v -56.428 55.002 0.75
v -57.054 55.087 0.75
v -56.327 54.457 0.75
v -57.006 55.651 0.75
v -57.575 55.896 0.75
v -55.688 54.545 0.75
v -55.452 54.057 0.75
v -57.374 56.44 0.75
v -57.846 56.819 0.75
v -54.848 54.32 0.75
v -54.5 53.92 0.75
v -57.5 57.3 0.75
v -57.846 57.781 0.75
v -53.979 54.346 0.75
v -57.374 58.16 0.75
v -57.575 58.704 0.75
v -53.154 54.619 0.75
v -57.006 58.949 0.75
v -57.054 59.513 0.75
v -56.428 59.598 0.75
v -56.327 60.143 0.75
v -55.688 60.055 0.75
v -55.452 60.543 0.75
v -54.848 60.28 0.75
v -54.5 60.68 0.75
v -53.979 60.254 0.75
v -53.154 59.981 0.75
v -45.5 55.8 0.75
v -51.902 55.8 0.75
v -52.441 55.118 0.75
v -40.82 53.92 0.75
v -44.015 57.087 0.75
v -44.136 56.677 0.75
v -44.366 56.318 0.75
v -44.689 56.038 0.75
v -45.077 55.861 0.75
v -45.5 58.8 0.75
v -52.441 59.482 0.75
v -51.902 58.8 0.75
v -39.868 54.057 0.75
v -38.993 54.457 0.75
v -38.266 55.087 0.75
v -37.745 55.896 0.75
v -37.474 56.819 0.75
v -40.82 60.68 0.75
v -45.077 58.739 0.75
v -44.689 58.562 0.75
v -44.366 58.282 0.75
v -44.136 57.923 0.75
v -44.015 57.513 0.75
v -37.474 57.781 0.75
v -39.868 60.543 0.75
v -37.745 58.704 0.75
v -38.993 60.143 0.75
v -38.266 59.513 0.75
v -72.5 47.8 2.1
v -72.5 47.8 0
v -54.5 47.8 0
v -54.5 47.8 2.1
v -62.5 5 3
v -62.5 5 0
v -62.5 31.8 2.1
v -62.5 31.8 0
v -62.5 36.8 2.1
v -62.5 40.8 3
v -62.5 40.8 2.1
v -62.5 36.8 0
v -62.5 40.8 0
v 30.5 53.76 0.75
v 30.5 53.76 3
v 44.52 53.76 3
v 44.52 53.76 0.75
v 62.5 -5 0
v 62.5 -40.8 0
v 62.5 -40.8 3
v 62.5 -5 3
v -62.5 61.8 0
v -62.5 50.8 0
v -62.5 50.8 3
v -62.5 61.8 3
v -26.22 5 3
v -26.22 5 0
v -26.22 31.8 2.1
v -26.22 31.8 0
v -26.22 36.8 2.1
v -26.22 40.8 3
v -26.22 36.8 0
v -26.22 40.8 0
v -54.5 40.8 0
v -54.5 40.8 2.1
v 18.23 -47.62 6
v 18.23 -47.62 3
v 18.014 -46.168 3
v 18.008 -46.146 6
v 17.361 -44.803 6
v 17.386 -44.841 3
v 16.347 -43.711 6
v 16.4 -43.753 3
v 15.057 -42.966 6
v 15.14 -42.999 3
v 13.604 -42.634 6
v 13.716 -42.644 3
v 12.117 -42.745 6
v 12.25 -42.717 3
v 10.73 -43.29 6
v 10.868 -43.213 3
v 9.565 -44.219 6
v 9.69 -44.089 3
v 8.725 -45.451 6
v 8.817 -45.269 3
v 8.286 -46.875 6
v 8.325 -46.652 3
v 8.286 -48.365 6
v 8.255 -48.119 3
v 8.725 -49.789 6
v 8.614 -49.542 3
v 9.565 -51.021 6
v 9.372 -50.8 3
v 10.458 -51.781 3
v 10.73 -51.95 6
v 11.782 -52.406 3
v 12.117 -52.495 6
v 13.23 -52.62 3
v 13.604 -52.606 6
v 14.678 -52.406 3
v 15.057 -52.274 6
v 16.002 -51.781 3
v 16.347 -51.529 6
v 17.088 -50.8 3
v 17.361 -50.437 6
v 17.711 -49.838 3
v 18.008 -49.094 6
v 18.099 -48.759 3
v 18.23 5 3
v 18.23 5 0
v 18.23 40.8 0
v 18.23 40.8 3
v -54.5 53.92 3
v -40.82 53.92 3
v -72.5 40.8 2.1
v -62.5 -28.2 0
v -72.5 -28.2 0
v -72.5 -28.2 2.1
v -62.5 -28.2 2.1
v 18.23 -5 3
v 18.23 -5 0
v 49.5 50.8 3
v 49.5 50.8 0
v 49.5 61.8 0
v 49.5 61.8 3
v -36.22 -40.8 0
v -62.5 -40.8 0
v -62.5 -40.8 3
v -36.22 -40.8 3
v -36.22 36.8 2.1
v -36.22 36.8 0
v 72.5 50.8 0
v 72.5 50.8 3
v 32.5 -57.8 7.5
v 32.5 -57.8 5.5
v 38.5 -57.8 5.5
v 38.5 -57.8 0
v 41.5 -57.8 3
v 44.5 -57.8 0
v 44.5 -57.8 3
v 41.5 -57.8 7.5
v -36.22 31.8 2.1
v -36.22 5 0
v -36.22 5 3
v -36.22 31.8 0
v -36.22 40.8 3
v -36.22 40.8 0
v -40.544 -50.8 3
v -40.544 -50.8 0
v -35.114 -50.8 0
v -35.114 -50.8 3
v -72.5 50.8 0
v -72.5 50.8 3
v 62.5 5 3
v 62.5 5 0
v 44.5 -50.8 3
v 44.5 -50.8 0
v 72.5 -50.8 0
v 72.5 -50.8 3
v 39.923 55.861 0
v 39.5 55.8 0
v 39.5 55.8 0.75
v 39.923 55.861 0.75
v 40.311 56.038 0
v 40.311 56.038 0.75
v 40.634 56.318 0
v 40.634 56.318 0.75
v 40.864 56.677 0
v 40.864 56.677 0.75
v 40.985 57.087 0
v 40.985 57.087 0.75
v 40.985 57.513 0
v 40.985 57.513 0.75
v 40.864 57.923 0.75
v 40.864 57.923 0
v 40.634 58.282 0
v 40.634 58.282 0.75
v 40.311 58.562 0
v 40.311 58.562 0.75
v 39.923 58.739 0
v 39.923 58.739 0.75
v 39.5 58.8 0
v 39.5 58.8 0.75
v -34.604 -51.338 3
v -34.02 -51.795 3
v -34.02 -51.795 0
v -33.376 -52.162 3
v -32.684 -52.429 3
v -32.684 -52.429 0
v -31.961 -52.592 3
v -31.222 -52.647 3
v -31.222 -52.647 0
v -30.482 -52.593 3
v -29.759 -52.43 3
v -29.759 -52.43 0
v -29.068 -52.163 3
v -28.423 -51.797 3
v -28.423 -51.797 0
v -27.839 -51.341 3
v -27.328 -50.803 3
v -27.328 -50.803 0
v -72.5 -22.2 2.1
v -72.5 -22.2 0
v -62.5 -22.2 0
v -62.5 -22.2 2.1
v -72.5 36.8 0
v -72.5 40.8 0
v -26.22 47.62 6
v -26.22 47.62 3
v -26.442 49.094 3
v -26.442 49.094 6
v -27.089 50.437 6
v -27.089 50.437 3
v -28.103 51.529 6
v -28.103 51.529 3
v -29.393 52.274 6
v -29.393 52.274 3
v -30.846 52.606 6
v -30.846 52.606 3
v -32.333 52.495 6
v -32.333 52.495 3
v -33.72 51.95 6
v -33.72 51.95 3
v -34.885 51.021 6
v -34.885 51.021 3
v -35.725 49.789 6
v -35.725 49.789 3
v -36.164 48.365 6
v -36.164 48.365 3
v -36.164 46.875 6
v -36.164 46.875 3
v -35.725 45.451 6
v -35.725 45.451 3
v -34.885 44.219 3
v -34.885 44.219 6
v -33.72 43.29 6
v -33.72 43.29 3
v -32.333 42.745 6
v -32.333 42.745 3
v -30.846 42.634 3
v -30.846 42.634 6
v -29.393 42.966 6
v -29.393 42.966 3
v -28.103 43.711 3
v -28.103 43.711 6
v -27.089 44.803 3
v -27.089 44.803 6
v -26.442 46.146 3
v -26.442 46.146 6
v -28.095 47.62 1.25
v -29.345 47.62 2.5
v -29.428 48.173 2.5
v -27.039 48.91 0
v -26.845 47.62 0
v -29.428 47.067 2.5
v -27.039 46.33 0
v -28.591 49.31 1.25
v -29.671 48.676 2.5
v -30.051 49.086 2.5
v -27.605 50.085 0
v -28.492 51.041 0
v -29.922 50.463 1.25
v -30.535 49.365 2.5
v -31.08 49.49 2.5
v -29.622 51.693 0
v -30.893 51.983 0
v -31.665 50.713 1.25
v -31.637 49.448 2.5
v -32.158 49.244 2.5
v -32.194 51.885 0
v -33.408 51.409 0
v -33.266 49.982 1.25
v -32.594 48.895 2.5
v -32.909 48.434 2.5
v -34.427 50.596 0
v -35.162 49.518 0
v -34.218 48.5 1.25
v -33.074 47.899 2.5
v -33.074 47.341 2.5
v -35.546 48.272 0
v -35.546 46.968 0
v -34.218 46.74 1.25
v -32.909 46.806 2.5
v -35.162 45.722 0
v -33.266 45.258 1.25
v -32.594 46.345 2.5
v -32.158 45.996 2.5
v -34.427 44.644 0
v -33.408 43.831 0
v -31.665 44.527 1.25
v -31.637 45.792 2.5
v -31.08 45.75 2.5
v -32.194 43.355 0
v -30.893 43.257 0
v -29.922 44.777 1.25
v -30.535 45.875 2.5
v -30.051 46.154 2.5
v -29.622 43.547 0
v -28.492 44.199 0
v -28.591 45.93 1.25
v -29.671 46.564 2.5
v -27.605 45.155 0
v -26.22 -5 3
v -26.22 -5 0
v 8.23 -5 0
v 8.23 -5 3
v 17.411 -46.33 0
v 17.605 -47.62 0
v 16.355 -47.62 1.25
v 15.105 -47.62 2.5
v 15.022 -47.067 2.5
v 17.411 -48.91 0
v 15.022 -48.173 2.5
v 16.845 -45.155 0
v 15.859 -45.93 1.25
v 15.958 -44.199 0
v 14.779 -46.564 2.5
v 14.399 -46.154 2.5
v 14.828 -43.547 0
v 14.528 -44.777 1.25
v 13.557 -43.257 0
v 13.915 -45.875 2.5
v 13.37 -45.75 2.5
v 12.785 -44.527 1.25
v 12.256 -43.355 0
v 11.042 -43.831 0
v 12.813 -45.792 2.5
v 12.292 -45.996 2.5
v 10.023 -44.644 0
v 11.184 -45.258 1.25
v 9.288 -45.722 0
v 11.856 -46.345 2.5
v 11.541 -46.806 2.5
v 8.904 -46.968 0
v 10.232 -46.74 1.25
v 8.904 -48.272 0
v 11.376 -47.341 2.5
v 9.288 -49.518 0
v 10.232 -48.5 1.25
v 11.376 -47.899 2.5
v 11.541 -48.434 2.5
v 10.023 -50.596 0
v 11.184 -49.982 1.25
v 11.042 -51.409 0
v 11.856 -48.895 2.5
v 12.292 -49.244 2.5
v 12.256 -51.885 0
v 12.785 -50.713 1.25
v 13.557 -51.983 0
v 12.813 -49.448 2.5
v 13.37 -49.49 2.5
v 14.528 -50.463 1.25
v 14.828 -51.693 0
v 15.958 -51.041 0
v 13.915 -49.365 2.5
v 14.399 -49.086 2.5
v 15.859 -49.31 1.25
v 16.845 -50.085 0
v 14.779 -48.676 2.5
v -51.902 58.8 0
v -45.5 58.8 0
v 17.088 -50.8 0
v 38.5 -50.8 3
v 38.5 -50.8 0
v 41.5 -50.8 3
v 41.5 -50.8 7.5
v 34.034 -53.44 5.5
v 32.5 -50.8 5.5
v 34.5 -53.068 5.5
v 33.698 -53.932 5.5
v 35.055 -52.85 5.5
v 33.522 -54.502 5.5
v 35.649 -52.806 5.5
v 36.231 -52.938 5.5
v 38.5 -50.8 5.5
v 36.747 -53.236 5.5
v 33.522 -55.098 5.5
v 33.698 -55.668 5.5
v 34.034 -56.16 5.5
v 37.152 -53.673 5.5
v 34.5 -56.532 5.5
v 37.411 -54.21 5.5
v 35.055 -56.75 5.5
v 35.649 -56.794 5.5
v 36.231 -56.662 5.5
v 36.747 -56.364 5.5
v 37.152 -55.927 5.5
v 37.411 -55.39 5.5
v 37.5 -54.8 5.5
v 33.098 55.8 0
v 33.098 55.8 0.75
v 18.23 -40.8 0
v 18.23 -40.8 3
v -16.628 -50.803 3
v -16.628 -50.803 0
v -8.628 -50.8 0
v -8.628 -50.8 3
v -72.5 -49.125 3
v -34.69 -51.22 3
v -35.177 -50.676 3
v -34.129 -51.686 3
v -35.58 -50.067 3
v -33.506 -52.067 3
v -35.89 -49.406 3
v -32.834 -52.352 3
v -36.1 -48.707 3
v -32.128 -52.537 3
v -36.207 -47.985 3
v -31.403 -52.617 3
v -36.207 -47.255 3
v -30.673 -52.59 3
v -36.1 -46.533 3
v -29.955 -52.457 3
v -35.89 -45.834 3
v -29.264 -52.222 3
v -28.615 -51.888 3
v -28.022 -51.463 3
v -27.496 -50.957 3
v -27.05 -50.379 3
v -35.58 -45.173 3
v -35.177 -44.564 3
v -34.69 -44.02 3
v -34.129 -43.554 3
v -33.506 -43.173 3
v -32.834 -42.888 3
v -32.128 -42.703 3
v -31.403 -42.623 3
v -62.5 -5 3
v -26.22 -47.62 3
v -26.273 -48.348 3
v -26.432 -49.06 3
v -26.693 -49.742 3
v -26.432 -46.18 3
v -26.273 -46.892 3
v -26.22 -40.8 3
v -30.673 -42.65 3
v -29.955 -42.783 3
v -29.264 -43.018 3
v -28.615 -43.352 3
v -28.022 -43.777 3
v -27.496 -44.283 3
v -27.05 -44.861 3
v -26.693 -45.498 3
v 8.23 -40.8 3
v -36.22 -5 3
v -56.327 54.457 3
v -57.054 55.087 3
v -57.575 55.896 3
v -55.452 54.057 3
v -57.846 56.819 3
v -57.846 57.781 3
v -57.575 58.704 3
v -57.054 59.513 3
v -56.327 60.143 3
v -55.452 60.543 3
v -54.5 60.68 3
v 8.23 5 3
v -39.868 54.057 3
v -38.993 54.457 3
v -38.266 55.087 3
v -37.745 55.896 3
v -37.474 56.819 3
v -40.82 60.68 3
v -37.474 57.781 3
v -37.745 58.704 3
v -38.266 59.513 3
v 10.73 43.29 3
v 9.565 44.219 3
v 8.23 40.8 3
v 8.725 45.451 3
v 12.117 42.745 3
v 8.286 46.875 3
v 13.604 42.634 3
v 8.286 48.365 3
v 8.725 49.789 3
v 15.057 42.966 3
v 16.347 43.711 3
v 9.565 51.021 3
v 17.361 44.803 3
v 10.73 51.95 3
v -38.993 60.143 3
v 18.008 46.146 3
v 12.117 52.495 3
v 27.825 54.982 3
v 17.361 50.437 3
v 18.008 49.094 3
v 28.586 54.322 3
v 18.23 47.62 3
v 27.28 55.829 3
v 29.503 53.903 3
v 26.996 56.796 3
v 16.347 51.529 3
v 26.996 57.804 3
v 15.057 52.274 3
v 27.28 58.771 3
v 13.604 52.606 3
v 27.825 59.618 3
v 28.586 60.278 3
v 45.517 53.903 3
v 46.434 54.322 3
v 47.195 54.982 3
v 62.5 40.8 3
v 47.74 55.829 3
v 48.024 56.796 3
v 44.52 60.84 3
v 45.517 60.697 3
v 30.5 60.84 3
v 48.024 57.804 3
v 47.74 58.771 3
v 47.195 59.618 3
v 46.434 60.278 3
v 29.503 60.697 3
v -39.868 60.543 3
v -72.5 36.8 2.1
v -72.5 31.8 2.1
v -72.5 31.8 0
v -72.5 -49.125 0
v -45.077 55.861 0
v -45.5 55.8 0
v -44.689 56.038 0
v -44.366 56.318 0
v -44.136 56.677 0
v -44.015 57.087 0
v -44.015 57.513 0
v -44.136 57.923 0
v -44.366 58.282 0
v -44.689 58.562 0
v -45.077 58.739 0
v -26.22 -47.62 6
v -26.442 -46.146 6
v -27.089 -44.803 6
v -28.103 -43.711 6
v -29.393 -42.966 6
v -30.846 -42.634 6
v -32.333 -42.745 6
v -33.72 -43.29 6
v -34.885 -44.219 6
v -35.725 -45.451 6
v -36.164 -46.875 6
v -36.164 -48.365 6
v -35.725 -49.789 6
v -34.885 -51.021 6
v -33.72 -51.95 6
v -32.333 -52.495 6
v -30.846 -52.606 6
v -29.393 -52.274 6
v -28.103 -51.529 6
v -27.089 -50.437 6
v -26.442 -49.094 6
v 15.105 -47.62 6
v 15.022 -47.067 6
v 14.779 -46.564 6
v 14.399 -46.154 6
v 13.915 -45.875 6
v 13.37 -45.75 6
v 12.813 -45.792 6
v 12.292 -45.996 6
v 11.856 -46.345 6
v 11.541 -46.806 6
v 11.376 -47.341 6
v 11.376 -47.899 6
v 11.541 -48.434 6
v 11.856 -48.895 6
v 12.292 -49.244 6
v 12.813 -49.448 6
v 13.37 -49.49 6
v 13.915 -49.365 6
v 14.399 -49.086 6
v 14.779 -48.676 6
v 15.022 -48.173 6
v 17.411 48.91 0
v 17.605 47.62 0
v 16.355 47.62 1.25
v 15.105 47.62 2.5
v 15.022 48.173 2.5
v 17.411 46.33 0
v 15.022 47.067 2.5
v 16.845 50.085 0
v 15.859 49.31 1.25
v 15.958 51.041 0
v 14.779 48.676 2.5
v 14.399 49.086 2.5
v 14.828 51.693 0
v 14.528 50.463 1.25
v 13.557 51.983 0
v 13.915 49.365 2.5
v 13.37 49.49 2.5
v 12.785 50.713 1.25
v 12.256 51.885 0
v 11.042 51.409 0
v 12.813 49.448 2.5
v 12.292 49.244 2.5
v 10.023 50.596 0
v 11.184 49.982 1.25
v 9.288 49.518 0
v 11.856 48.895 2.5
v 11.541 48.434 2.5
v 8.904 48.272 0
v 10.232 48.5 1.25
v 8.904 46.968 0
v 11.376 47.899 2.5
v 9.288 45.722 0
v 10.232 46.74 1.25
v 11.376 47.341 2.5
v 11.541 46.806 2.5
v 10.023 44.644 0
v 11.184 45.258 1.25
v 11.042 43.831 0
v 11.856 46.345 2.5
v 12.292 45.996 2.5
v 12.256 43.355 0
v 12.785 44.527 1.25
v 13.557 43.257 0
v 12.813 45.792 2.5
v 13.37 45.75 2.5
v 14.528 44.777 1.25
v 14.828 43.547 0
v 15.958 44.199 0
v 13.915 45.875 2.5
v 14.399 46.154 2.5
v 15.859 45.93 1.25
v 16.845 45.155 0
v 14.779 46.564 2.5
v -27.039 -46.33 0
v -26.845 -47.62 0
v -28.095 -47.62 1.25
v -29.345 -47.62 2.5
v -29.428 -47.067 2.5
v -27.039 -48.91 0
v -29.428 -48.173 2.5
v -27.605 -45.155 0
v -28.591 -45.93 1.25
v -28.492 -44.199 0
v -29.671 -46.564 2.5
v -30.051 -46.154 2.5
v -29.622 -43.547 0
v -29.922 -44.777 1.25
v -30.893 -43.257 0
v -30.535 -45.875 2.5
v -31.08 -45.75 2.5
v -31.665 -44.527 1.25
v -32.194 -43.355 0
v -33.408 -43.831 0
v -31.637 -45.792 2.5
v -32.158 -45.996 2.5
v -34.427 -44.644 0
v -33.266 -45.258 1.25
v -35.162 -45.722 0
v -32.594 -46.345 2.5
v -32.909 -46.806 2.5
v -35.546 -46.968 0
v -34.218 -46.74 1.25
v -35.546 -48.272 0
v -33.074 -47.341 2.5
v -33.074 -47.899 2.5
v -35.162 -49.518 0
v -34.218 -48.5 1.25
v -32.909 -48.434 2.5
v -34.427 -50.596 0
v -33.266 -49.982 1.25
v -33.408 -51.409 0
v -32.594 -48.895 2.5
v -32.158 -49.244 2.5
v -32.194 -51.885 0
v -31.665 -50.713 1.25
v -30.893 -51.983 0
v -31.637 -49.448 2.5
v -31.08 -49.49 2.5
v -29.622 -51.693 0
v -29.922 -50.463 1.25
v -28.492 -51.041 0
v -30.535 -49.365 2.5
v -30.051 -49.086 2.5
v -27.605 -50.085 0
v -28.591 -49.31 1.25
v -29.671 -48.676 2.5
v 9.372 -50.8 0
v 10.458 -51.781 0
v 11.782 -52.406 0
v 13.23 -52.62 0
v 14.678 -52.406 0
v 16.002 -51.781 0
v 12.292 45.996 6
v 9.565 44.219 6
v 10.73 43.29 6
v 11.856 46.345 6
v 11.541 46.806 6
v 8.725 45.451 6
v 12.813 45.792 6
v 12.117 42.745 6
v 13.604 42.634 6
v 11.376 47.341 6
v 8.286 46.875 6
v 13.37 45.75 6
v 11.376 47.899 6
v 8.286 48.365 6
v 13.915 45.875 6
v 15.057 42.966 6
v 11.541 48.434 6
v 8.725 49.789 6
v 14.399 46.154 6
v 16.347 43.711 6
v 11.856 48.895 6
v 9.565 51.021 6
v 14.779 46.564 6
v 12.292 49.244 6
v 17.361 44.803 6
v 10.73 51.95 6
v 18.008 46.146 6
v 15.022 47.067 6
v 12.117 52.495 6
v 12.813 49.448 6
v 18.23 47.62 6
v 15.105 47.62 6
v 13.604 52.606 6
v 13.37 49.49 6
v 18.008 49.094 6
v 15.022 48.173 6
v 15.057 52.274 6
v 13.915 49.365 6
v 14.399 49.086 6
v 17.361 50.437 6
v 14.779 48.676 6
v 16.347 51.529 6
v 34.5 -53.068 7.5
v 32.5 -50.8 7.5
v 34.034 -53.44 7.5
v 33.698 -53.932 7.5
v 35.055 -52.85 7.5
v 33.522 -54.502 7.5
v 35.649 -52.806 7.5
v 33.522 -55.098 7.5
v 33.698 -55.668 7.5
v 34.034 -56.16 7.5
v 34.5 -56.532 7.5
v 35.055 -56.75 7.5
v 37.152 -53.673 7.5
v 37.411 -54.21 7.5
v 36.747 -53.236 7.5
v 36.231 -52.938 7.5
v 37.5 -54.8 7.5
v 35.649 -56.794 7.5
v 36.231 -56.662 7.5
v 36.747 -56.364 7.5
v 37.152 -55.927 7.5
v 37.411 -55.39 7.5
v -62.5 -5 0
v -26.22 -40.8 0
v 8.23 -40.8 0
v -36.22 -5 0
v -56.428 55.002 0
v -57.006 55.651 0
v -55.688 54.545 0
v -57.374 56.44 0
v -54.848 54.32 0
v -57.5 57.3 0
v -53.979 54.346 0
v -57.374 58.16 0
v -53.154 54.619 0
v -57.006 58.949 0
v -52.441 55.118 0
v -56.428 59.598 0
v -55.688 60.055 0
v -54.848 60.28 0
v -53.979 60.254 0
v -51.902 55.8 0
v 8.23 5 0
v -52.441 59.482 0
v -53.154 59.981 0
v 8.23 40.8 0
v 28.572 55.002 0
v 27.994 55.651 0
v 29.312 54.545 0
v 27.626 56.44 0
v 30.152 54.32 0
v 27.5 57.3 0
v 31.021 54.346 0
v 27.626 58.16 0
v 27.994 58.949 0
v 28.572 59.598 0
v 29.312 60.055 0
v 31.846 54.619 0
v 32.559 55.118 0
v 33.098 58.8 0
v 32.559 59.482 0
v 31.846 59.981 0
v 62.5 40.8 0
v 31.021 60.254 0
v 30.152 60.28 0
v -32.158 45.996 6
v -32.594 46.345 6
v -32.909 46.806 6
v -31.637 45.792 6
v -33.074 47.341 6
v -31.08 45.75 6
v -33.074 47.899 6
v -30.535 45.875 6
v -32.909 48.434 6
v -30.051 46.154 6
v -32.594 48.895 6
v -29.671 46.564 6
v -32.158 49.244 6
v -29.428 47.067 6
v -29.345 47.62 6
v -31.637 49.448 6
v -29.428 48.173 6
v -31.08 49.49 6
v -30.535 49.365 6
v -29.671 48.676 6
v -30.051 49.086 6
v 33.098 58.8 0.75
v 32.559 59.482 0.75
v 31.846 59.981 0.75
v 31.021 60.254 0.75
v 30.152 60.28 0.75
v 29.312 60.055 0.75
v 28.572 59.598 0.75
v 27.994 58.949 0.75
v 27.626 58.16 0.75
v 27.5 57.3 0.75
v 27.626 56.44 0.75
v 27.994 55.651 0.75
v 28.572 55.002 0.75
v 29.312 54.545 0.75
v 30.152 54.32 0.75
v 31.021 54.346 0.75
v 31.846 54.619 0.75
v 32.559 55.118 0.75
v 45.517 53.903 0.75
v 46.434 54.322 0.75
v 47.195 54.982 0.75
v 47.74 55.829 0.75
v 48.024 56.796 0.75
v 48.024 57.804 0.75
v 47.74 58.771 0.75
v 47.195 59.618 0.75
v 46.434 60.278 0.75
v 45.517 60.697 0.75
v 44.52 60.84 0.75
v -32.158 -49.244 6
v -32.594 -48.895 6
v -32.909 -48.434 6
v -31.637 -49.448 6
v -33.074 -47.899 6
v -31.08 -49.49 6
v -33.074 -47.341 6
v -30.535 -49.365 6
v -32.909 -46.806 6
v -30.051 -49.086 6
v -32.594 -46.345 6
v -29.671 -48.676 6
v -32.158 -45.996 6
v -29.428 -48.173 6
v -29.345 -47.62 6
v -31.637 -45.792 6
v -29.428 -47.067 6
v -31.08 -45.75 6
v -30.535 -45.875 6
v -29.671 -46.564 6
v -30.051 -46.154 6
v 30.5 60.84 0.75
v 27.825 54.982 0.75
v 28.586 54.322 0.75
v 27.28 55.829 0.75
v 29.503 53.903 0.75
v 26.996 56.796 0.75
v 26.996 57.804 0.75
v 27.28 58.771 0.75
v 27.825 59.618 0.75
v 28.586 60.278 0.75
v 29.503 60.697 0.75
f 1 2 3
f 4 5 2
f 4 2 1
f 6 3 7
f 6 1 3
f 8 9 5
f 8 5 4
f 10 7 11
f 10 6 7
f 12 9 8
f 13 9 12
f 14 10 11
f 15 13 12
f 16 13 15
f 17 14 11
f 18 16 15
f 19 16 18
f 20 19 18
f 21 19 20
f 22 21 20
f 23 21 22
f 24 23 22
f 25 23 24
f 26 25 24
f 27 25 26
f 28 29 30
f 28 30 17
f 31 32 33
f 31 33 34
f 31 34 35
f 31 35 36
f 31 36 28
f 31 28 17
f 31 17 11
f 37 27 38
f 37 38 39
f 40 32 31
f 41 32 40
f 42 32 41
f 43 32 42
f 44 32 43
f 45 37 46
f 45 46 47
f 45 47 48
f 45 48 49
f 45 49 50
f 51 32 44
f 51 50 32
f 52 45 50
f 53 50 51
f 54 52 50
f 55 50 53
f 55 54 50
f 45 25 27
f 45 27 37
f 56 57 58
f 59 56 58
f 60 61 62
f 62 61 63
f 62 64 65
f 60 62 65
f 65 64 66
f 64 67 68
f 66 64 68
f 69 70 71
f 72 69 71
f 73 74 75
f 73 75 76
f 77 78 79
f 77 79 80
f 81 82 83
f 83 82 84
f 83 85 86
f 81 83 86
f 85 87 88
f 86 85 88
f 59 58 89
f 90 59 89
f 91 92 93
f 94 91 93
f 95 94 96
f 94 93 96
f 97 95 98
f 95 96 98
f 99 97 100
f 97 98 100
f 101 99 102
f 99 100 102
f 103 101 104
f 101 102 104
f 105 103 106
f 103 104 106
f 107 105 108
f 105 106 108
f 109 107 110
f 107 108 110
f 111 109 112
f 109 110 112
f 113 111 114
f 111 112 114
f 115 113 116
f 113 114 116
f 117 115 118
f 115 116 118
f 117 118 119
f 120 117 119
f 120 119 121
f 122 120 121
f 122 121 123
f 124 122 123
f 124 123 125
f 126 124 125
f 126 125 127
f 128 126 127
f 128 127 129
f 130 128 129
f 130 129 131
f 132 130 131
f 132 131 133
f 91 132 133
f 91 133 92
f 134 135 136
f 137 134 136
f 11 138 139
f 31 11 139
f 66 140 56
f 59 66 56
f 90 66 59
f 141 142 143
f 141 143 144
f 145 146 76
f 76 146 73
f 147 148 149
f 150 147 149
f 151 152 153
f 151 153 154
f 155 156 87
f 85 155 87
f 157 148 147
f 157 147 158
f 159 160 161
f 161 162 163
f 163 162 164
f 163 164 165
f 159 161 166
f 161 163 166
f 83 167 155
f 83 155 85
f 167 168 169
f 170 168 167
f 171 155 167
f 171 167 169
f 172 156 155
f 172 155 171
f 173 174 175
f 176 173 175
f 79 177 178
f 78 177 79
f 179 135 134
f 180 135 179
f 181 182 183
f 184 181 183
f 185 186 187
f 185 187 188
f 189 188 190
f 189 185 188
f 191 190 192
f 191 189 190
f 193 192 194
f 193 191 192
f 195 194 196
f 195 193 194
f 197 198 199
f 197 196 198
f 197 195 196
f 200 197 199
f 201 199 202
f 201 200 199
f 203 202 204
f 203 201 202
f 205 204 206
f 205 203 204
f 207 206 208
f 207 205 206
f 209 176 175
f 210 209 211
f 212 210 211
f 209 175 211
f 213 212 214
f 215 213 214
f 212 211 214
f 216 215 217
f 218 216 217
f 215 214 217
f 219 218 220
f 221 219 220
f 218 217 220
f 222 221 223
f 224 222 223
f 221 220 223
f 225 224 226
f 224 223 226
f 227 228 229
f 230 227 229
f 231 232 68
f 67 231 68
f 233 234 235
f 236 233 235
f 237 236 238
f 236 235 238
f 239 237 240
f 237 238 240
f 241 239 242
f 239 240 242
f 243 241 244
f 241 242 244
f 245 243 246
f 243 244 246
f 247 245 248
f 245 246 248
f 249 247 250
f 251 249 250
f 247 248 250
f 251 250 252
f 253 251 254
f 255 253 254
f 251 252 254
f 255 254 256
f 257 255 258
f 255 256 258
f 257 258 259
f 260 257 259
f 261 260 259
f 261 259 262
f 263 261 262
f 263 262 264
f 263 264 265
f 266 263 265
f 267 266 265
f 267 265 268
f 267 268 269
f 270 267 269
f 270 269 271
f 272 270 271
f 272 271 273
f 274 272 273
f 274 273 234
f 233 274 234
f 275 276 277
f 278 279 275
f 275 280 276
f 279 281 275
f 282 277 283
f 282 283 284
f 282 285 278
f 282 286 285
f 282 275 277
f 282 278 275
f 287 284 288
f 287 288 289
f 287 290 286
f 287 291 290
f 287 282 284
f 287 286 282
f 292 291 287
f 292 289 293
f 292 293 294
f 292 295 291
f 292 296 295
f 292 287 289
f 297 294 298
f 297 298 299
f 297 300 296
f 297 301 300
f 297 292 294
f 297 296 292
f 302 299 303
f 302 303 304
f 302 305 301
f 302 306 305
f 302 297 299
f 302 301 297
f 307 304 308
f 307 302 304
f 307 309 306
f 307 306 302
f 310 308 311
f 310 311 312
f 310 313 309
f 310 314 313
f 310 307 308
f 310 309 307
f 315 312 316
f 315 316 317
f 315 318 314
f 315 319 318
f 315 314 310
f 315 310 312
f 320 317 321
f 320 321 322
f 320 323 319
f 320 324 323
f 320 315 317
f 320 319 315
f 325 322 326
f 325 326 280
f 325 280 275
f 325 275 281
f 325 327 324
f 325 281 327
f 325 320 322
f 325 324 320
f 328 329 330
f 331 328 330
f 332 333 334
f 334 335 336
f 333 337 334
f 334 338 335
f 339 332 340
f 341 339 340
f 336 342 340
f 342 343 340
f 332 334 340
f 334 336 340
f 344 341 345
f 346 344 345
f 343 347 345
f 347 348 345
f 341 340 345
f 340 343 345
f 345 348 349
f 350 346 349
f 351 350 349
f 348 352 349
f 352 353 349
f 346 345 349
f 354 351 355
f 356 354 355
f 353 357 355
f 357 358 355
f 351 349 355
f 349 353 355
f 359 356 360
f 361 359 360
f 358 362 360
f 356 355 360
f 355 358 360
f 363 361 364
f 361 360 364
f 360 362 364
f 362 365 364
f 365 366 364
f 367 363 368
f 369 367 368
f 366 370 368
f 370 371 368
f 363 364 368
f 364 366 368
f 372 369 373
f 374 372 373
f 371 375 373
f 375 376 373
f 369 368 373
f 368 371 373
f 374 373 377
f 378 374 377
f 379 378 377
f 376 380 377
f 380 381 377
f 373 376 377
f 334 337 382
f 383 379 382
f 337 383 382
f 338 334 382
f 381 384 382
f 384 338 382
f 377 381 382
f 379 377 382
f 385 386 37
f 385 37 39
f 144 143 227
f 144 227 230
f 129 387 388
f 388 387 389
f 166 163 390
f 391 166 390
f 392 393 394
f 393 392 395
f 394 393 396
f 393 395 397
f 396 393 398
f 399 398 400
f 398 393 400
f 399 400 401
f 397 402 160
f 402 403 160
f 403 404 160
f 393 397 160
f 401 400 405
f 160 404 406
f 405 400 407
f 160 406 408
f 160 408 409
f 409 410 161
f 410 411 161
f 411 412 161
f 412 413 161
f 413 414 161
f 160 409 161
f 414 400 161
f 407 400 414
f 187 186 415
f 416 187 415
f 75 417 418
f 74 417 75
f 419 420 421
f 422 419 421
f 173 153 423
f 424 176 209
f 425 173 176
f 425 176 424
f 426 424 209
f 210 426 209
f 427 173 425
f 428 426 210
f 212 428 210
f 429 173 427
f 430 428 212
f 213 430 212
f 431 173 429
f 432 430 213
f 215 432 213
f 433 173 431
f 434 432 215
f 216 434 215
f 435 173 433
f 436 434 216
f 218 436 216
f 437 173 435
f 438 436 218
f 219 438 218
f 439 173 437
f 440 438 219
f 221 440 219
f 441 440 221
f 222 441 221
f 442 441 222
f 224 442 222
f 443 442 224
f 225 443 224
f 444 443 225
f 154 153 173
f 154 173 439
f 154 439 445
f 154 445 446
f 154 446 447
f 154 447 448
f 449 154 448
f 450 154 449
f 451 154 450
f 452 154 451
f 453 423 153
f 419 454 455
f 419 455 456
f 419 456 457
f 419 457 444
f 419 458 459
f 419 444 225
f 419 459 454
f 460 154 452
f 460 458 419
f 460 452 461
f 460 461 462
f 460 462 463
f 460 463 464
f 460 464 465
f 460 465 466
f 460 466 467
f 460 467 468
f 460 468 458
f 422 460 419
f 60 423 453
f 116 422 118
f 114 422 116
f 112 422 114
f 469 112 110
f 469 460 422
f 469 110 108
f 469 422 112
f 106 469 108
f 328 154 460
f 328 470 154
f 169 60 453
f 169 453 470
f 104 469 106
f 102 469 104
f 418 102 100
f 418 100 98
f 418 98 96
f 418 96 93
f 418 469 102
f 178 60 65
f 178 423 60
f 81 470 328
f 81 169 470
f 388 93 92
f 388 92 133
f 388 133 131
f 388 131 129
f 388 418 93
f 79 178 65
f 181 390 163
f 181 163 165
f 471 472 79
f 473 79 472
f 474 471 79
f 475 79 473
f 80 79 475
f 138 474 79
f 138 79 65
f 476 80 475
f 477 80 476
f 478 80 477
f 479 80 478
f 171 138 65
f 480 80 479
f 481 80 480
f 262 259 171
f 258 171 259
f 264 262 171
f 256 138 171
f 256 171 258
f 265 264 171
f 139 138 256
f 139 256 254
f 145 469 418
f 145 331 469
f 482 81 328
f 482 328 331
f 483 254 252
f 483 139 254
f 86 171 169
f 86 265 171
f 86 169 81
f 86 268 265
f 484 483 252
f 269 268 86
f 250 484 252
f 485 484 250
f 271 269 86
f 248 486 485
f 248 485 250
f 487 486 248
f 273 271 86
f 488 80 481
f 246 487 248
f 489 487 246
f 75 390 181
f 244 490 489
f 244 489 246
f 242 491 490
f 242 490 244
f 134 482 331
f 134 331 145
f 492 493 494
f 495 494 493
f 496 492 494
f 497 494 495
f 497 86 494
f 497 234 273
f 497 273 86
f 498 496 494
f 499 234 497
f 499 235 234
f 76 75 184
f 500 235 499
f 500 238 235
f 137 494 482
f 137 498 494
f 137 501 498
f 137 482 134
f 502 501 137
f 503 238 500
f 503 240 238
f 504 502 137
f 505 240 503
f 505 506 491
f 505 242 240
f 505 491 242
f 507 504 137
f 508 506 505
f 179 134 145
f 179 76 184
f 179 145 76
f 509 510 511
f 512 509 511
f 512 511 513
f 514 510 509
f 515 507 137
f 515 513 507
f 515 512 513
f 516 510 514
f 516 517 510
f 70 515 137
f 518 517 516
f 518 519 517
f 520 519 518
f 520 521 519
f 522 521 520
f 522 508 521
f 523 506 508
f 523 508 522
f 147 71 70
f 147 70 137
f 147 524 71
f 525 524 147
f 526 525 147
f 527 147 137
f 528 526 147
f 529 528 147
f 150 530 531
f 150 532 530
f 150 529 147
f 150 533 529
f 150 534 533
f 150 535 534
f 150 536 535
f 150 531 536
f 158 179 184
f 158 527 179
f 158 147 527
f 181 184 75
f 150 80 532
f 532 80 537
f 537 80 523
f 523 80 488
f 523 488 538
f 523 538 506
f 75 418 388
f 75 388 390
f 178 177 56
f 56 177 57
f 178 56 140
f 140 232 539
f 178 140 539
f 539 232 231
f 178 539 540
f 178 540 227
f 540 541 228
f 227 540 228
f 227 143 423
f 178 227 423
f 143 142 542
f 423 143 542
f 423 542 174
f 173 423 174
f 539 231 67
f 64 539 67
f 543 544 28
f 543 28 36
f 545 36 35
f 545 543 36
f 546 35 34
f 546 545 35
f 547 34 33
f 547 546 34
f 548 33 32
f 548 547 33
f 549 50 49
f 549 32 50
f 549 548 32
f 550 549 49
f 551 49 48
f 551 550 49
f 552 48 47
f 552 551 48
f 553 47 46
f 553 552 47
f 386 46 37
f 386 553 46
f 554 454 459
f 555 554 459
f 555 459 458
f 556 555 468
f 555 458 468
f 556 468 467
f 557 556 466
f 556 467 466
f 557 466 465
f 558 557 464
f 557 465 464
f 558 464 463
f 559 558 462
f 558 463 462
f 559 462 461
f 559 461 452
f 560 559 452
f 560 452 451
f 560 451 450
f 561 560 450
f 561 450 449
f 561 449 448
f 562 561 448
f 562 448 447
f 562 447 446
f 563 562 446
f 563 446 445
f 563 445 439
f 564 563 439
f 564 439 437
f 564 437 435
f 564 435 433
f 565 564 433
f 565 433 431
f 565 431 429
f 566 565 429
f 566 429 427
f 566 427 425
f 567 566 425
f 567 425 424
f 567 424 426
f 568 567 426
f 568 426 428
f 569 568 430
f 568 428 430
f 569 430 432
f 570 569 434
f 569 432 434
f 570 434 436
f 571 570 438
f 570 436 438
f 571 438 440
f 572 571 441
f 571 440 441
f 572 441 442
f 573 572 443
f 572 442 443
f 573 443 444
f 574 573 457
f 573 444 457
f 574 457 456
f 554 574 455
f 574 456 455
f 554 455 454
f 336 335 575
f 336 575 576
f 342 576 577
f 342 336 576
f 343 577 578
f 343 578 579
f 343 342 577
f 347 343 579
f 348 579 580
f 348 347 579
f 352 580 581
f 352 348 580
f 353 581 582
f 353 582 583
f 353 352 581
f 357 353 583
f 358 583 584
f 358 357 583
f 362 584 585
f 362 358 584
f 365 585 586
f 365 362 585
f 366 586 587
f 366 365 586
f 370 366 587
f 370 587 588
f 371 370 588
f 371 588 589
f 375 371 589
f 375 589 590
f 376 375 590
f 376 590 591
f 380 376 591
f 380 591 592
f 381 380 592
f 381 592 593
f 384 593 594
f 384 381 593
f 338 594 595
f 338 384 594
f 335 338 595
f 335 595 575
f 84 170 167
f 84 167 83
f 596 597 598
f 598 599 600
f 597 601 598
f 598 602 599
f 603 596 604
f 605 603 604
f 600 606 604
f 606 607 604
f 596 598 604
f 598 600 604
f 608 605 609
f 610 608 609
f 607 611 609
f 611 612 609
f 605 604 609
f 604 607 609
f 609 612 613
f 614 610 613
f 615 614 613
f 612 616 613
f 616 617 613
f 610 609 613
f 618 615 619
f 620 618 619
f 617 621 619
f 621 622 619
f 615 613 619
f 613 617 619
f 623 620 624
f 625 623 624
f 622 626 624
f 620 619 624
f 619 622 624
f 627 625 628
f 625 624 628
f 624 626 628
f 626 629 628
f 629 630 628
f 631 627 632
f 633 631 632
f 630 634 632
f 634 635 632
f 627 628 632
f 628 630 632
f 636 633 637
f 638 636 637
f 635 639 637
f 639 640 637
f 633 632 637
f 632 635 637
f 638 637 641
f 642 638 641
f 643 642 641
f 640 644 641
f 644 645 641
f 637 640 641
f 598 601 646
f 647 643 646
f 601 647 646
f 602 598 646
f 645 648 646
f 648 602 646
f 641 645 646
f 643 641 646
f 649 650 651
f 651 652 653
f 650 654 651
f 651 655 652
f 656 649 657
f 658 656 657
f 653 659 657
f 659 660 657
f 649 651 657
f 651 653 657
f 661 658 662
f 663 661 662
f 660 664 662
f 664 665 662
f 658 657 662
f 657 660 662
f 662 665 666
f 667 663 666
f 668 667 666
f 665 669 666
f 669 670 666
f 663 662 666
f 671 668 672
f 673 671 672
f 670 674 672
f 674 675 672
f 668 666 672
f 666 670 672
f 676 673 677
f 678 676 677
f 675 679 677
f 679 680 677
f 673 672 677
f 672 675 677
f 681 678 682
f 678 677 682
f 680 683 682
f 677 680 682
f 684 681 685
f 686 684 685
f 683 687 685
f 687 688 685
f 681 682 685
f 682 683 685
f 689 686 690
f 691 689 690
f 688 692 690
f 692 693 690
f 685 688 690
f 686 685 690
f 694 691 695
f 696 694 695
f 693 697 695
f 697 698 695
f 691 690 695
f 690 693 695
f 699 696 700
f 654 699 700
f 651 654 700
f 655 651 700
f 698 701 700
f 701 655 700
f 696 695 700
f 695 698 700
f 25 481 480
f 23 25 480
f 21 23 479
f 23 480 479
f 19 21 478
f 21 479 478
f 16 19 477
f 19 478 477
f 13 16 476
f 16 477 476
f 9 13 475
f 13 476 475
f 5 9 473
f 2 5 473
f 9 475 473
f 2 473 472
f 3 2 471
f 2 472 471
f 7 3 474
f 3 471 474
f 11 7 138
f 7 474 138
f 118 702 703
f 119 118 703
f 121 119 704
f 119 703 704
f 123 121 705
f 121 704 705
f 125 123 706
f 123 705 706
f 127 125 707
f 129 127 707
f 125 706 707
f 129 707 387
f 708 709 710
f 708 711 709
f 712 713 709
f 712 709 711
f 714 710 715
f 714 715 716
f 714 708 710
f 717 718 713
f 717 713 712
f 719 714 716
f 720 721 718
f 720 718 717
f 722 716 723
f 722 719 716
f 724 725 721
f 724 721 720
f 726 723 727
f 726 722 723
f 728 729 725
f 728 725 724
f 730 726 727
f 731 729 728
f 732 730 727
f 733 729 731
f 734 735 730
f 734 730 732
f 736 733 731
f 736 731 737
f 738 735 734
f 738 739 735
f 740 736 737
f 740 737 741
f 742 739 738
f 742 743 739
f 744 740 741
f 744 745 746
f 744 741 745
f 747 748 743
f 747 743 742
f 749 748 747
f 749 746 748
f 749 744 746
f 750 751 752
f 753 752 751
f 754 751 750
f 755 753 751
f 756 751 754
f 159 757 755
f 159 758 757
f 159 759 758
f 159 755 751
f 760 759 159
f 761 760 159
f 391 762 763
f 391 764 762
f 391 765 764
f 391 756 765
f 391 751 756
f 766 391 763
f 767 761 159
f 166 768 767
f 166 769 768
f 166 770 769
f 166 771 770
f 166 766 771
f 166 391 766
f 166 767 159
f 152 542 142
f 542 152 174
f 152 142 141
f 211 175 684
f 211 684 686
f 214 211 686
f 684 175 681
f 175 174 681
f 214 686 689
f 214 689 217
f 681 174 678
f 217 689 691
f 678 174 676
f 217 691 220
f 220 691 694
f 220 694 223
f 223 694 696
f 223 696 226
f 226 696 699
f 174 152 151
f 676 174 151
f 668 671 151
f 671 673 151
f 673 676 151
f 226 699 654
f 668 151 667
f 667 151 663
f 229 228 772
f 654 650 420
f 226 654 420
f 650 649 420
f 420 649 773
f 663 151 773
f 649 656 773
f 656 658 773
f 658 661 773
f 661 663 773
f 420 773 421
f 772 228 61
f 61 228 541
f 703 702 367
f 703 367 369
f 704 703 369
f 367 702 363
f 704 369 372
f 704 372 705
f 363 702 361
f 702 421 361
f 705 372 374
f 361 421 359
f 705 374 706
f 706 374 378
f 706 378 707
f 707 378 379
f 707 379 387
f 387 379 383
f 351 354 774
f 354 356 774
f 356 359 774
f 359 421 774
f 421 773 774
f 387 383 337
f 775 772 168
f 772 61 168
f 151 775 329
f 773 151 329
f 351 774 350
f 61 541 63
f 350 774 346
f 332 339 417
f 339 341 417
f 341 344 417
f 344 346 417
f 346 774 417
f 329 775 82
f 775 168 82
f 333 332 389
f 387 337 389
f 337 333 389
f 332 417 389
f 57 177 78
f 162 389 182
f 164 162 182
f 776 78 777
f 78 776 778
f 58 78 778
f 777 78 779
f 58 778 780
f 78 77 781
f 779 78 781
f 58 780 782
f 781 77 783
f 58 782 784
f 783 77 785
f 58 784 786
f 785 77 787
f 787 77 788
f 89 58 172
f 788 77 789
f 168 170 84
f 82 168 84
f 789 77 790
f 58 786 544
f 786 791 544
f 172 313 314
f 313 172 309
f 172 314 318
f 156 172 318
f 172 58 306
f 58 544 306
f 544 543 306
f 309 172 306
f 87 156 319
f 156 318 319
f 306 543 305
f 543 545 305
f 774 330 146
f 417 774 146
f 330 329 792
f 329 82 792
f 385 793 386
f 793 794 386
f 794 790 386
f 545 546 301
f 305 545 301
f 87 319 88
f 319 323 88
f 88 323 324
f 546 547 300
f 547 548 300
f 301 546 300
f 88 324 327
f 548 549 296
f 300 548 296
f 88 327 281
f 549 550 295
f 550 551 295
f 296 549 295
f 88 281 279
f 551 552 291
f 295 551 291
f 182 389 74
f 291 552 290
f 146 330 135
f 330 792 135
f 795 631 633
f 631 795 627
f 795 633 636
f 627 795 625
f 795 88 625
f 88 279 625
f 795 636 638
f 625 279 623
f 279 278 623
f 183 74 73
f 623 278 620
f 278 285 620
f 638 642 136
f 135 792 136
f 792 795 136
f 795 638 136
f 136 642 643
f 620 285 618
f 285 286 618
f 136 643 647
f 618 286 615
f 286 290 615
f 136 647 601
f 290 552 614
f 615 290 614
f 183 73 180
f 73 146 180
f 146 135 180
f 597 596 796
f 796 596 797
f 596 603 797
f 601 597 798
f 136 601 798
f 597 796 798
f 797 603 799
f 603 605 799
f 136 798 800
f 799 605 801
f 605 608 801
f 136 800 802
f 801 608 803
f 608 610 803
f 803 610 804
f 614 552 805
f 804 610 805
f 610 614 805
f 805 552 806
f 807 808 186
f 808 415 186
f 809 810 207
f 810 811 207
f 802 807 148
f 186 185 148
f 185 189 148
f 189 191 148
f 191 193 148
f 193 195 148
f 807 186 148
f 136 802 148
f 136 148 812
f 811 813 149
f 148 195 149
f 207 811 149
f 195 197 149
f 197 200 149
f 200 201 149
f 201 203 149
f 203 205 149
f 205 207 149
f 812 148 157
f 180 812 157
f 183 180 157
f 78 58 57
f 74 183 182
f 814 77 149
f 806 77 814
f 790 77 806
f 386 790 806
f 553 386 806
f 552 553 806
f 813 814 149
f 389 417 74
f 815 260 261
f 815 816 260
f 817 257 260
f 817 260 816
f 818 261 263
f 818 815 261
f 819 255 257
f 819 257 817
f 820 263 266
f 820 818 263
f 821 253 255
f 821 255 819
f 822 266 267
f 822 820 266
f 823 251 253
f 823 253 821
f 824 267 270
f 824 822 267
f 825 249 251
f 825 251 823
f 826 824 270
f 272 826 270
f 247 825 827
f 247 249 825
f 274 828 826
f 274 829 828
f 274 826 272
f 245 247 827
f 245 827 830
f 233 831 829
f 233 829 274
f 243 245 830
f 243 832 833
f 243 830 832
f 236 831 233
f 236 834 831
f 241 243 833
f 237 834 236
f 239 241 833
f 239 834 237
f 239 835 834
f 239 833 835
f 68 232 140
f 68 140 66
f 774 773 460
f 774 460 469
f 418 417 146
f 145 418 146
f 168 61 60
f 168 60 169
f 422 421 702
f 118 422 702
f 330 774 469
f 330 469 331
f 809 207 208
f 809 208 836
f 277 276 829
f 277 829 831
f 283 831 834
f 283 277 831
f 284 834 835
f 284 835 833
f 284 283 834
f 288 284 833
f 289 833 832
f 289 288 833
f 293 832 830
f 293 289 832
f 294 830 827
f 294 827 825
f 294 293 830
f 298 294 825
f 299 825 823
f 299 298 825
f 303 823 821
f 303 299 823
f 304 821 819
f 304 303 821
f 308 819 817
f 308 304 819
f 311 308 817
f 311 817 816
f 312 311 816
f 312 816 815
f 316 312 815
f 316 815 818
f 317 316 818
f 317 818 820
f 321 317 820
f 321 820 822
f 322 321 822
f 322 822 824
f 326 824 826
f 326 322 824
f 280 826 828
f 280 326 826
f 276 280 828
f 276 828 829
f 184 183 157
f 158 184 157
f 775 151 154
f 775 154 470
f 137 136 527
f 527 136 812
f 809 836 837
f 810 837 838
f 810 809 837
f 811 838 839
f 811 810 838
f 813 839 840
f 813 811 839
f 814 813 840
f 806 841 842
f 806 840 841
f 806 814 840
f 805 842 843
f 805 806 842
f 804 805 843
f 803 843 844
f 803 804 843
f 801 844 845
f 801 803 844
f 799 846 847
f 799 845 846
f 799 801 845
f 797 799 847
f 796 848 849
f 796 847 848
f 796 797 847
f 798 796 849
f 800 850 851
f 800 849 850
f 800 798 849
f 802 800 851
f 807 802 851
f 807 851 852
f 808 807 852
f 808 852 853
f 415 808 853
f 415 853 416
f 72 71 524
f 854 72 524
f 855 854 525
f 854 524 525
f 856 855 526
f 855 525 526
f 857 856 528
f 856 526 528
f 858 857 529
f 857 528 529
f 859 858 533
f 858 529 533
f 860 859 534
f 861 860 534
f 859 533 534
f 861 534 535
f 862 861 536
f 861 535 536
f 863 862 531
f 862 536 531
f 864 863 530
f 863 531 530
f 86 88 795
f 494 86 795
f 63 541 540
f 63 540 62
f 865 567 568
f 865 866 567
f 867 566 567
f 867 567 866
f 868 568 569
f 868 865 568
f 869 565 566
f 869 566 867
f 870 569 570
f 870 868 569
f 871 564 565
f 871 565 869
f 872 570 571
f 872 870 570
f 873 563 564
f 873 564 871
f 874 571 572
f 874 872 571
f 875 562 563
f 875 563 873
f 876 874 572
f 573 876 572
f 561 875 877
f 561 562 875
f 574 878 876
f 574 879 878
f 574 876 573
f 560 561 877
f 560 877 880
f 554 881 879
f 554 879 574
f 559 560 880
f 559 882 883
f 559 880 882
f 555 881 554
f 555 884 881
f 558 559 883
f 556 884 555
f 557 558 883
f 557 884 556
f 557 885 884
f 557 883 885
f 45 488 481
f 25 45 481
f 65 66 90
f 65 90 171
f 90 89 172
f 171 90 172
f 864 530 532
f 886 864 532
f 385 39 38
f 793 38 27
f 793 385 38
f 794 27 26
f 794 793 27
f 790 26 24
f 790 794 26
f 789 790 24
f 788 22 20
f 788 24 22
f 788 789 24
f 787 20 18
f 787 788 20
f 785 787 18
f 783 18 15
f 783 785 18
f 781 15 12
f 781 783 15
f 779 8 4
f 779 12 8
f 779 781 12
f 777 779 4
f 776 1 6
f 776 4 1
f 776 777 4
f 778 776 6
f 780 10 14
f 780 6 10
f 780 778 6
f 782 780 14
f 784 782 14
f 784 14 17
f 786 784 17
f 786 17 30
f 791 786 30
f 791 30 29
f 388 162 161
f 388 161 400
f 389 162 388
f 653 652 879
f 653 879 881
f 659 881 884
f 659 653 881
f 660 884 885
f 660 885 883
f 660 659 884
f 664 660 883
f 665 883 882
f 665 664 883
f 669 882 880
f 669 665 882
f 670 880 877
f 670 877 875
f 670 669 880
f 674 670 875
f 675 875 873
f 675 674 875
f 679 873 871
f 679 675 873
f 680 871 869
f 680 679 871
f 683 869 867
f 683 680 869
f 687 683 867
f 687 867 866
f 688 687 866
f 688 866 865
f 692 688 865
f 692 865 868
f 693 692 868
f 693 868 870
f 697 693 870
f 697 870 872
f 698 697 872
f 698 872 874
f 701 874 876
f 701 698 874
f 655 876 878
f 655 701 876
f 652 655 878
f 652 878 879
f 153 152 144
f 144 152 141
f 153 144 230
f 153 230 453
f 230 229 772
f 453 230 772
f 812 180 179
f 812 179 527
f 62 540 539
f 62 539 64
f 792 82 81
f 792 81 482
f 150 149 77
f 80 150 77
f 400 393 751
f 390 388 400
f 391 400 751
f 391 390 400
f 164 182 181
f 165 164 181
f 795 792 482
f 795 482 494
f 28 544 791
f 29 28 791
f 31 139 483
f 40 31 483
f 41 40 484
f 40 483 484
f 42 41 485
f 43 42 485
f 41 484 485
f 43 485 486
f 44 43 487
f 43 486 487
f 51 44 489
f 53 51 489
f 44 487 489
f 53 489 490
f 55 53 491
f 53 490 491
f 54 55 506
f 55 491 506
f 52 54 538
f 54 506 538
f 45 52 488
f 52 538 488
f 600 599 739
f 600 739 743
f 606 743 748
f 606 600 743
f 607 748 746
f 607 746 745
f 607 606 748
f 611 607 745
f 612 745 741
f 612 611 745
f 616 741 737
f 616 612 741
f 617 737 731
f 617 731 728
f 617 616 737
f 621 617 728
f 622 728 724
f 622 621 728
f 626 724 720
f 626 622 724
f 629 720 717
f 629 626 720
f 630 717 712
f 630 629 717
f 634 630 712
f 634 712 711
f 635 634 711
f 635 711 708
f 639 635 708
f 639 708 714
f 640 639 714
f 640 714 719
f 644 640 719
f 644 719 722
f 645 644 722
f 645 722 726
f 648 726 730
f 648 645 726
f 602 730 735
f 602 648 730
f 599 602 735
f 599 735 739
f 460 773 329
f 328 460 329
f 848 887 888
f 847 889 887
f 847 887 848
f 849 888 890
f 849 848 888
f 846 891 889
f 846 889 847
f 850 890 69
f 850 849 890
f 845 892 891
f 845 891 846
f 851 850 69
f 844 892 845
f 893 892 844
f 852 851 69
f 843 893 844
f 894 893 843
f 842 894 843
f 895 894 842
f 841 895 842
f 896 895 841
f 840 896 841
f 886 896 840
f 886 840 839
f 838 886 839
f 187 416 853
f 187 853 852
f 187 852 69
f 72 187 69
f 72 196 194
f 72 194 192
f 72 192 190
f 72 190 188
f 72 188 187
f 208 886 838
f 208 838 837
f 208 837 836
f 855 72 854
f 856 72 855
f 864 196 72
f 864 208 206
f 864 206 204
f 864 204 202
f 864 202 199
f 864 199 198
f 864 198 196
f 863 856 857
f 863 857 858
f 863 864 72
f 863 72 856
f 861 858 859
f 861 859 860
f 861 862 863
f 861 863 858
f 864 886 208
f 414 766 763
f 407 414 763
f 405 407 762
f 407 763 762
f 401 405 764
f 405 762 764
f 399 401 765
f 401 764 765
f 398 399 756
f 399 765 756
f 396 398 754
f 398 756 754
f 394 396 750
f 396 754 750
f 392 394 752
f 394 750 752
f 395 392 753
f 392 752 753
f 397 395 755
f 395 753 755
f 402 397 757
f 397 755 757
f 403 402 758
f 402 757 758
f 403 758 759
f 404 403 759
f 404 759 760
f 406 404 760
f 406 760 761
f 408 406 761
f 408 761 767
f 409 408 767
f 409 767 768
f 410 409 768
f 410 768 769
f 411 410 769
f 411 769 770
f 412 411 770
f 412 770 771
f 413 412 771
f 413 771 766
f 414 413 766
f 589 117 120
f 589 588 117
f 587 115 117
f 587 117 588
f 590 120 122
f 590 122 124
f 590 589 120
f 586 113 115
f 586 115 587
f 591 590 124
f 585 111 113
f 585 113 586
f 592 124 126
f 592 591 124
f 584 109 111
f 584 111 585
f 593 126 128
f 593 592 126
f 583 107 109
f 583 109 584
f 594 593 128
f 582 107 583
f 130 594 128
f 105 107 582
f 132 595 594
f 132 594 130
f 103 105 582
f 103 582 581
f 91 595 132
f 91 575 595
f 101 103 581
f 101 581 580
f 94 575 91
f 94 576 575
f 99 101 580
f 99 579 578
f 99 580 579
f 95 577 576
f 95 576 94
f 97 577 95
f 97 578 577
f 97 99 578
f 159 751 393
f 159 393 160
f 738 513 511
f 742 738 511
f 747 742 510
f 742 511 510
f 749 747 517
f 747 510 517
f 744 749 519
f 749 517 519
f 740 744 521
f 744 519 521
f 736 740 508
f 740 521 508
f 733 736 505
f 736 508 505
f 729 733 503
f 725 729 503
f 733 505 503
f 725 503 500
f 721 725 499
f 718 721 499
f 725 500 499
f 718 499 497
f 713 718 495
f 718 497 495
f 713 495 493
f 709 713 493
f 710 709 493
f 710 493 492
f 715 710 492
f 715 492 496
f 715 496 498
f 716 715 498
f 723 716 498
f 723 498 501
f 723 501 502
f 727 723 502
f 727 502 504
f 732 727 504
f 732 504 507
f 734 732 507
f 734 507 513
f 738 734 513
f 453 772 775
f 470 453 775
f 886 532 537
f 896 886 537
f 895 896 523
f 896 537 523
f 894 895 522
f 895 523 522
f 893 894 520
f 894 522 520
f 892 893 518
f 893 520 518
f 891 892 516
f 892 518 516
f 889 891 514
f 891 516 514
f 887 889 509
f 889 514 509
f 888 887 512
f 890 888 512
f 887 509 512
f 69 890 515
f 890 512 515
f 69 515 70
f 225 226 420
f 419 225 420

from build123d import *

# Parameters (mm, degrees)
SKETCH_R        = 1.875
SKETCH_W        = 26.28
SKETCH_H        = 35.8
SKETCH_W_2      = 34.45
SKETCH_W_3      = 44.27
PAD_DEPTH       = 3
SKETCH001_W     = 6
SKETCH001_H     = 3
PAD001_DEPTH    = 7
SKETCH002_W     = 3
SKETCH002_H     = 7
PAD002_DEPTH    = 4.5
SKETCH003_W     = 7
SKETCH003_H     = 2
PAD003_DEPTH    = 6
SKETCH004_R     = 2
POCKET_DEPTH    = 5
SKETCH005_R     = 5
SKETCH005_R_2   = 1.875
PAD004_DEPTH    = 6
POCKET001_DEPTH = 2.25
CHAMFER_SIZE    = 2.5
SKETCH007_W     = 46.28
SKETCH007_H     = 5
SKETCH007_W_2   = 18
SKETCH007_H_2   = 7
SKETCH007_W_3   = 10
SKETCH007_H_3   = 6
POCKET002_DEPTH = 2.1


with BuildPart() as part:
    # Sketch → Pad (new body)
    with BuildSketch(Plane.XY):
        with BuildLine():
            Line((-72.5, 50.8), (-72.5, -49.125249))
            Line((-72.5, -49.125249), (-40.543855, -50.8))
            Line((-40.543855, -50.8), (-35.113855, -50.8))
            ThreePointArc((-35.113855, -50.8), (-31.221817, -52.647375), (-27.328445, -50.802814))
            Line((-27.328445, -50.802814), (-16.628445, -50.802814))
            Line((-16.628445, -50.802814), (-8.628445, -50.8))
            Line((-8.628445, -50.8), (9.371555, -50.8))
            ThreePointArc((9.371555, -50.8), (13.23, -52.62), (17.088445, -50.8))
            Line((17.088445, -50.8), (72.5, -50.8))
            Line((72.5, -50.8), (72.5, 50.8))
            Line((49.5, 50.8), (72.5, 50.8))
            Line((49.5, 50.8), (49.5, 61.8))
            Line((49.5, 61.8), (-62.5, 61.8))
            Line((-62.5, 50.8), (-62.5, 61.8))
            Line((-72.5, 50.8), (-62.5, 50.8))
        make_face()
        with Locations((13.23, 47.62)):
            Circle(SKETCH_R, mode=Mode.SUBTRACT)
        with Locations((13.23, -47.62)):
            Circle(SKETCH_R, mode=Mode.SUBTRACT)
        with Locations((-31.22, -47.62)):
            Circle(SKETCH_R, mode=Mode.SUBTRACT)
        with Locations((-31.22, 47.62)):
            Circle(SKETCH_R, mode=Mode.SUBTRACT)
        with Locations((-49.36, 22.9)):
            Rectangle(SKETCH_W, SKETCH_H, mode=Mode.SUBTRACT)
        with Locations((-8.995, 22.9)):
            Rectangle(SKETCH_W_2, SKETCH_H, mode=Mode.SUBTRACT)
        with Locations((40.365, 22.9)):
            Rectangle(SKETCH_W_3, SKETCH_H, mode=Mode.SUBTRACT)
        with Locations((40.365, -22.9)):
            Rectangle(SKETCH_W_3, SKETCH_H, mode=Mode.SUBTRACT)
        with Locations((-8.995, -22.9)):
            Rectangle(SKETCH_W_2, SKETCH_H, mode=Mode.SUBTRACT)
        with Locations((-49.36, -22.9)):
            Rectangle(SKETCH_W, SKETCH_H, mode=Mode.SUBTRACT)
        with BuildLine():
            ThreePointArc((-45.5, 55.8), (-44, 57.3), (-45.5, 58.8))
            Line((-45.5, 58.8), (-51.901924, 58.8))
            ThreePointArc((-51.901924, 58.8), (-57.5, 57.3), (-51.901924, 55.8))
            Line((-45.5, 55.8), (-51.901924, 55.8))
        make_face(mode=Mode.SUBTRACT)
        with BuildLine():
            ThreePointArc((39.5, 55.8), (41, 57.3), (39.5, 58.8))
            Line((39.5, 58.8), (33.098076, 58.8))
            ThreePointArc((33.098076, 58.8), (27.5, 57.3), (33.098076, 55.8))
            Line((39.5, 55.8), (33.098076, 55.8))
        make_face(mode=Mode.SUBTRACT)
    extrude(amount=PAD_DEPTH)

    # Sketch001 (on Face9 of Pad) → Pad001 (join)
    with BuildSketch(Plane.XZ.offset(50.8)):
        with Locations((41.5, 1.5)):
            Rectangle(SKETCH001_W, SKETCH001_H)
    extrude(amount=PAD001_DEPTH)

    # Sketch002 (on Face56 of Pad001) → Pad002 (join)
    with BuildSketch(Plane.XY.offset(3)):
        with Locations((40, -54.3)):
            Rectangle(SKETCH002_W, SKETCH002_H)
    extrude(amount=PAD002_DEPTH)

    # Sketch003 (on Face61 of Pad002) → Pad003 (join)
    with BuildSketch(Plane(origin=(38.5, 0, 0), x_dir=(0, -1, 0), z_dir=(-1, 0, 0))):
        with Locations((54.3, 6.5)):
            Rectangle(SKETCH003_W, SKETCH003_H)
    extrude(amount=PAD003_DEPTH)

    # Sketch004 (on Face67 of Pad003) → Pocket (cut)
    with BuildSketch(Plane.XY.offset(7.5)):
        with Locations((35.5, -54.8)):
            Circle(SKETCH004_R)
    extrude(amount=-POCKET_DEPTH, mode=Mode.SUBTRACT)

    # Sketch005 → Pad004 (join)
    with BuildSketch(Plane.XY):
        with Locations((-31.22, 47.62)):
            Circle(SKETCH005_R)
        with Locations((-31.22, 47.62)):
            Circle(SKETCH005_R_2, mode=Mode.SUBTRACT)
        with Locations((13.23, 47.62)):
            Circle(SKETCH005_R)
        with Locations((13.23, 47.62)):
            Circle(SKETCH005_R_2, mode=Mode.SUBTRACT)
        with Locations((-31.22, -47.62)):
            Circle(SKETCH005_R)
        with Locations((-31.22, -47.62)):
            Circle(SKETCH005_R_2, mode=Mode.SUBTRACT)
        with Locations((13.23, -47.62)):
            Circle(SKETCH005_R)
        with Locations((13.23, -47.62)):
            Circle(SKETCH005_R_2, mode=Mode.SUBTRACT)
    extrude(amount=PAD004_DEPTH)

    # Sketch006 (on Face5 of Pad004) → Pocket001 (cut)
    with BuildSketch(Plane.XY.offset(3)):
        with BuildLine():
            ThreePointArc((-54.5, 60.68), (-57.88, 57.3), (-54.5, 53.92))
            Line((-54.5, 53.92), (-40.82, 53.92))
            ThreePointArc((-40.82, 53.92), (-37.44, 57.3), (-40.82, 60.68))
            Line((-40.82, 60.68), (-54.5, 60.68))
        make_face()
        with BuildLine():
            ThreePointArc((30.5, 60.84), (26.96, 57.3), (30.5, 53.76))
            Line((30.5, 53.76), (44.52, 53.76))
            ThreePointArc((44.52, 53.76), (48.06, 57.3), (44.52, 60.84))
            Line((44.52, 60.84), (30.5, 60.84))
        make_face()
    extrude(amount=-POCKET001_DEPTH, mode=Mode.SUBTRACT)

    # Chamfer
    chamfer_edges = [part.edges().sort_by_distance(p)[0] for p in [
        (-29.345, -47.62, 1.5),
        (-33.095, -47.62, 0),
        (-33.095, -47.62, 3),
        (15.105, -47.62, 1.5),
        (11.355, -47.62, 0),
        (11.355, -47.62, 3),
        (-29.345, 47.62, 1.5),
        (-33.095, 47.62, 0),
        (-33.095, 47.62, 3),
        (15.105, 47.62, 1.5),
        (11.355, 47.62, 0),
        (11.355, 47.62, 3),
    ]]
    chamfer(chamfer_edges, length=CHAMFER_SIZE)

    # Sketch007 (on Face52 of Pad) → Pocket002 (cut)
    with BuildSketch(Plane(origin=(0, 0, 0), x_dir=(1, 0, 0), z_dir=(0, 0, -1))):
        with Locations((-49.36, -34.3)):
            Rectangle(SKETCH007_W, SKETCH007_H)
        with Locations((-63.5, -44.3)):
            Rectangle(SKETCH007_W_2, SKETCH007_H_2)
        with Locations((-67.5, 25.2)):
            Rectangle(SKETCH007_W_3, SKETCH007_H_3)
    extrude(amount=-POCKET002_DEPTH, mode=Mode.SUBTRACT)


solid = part.part
